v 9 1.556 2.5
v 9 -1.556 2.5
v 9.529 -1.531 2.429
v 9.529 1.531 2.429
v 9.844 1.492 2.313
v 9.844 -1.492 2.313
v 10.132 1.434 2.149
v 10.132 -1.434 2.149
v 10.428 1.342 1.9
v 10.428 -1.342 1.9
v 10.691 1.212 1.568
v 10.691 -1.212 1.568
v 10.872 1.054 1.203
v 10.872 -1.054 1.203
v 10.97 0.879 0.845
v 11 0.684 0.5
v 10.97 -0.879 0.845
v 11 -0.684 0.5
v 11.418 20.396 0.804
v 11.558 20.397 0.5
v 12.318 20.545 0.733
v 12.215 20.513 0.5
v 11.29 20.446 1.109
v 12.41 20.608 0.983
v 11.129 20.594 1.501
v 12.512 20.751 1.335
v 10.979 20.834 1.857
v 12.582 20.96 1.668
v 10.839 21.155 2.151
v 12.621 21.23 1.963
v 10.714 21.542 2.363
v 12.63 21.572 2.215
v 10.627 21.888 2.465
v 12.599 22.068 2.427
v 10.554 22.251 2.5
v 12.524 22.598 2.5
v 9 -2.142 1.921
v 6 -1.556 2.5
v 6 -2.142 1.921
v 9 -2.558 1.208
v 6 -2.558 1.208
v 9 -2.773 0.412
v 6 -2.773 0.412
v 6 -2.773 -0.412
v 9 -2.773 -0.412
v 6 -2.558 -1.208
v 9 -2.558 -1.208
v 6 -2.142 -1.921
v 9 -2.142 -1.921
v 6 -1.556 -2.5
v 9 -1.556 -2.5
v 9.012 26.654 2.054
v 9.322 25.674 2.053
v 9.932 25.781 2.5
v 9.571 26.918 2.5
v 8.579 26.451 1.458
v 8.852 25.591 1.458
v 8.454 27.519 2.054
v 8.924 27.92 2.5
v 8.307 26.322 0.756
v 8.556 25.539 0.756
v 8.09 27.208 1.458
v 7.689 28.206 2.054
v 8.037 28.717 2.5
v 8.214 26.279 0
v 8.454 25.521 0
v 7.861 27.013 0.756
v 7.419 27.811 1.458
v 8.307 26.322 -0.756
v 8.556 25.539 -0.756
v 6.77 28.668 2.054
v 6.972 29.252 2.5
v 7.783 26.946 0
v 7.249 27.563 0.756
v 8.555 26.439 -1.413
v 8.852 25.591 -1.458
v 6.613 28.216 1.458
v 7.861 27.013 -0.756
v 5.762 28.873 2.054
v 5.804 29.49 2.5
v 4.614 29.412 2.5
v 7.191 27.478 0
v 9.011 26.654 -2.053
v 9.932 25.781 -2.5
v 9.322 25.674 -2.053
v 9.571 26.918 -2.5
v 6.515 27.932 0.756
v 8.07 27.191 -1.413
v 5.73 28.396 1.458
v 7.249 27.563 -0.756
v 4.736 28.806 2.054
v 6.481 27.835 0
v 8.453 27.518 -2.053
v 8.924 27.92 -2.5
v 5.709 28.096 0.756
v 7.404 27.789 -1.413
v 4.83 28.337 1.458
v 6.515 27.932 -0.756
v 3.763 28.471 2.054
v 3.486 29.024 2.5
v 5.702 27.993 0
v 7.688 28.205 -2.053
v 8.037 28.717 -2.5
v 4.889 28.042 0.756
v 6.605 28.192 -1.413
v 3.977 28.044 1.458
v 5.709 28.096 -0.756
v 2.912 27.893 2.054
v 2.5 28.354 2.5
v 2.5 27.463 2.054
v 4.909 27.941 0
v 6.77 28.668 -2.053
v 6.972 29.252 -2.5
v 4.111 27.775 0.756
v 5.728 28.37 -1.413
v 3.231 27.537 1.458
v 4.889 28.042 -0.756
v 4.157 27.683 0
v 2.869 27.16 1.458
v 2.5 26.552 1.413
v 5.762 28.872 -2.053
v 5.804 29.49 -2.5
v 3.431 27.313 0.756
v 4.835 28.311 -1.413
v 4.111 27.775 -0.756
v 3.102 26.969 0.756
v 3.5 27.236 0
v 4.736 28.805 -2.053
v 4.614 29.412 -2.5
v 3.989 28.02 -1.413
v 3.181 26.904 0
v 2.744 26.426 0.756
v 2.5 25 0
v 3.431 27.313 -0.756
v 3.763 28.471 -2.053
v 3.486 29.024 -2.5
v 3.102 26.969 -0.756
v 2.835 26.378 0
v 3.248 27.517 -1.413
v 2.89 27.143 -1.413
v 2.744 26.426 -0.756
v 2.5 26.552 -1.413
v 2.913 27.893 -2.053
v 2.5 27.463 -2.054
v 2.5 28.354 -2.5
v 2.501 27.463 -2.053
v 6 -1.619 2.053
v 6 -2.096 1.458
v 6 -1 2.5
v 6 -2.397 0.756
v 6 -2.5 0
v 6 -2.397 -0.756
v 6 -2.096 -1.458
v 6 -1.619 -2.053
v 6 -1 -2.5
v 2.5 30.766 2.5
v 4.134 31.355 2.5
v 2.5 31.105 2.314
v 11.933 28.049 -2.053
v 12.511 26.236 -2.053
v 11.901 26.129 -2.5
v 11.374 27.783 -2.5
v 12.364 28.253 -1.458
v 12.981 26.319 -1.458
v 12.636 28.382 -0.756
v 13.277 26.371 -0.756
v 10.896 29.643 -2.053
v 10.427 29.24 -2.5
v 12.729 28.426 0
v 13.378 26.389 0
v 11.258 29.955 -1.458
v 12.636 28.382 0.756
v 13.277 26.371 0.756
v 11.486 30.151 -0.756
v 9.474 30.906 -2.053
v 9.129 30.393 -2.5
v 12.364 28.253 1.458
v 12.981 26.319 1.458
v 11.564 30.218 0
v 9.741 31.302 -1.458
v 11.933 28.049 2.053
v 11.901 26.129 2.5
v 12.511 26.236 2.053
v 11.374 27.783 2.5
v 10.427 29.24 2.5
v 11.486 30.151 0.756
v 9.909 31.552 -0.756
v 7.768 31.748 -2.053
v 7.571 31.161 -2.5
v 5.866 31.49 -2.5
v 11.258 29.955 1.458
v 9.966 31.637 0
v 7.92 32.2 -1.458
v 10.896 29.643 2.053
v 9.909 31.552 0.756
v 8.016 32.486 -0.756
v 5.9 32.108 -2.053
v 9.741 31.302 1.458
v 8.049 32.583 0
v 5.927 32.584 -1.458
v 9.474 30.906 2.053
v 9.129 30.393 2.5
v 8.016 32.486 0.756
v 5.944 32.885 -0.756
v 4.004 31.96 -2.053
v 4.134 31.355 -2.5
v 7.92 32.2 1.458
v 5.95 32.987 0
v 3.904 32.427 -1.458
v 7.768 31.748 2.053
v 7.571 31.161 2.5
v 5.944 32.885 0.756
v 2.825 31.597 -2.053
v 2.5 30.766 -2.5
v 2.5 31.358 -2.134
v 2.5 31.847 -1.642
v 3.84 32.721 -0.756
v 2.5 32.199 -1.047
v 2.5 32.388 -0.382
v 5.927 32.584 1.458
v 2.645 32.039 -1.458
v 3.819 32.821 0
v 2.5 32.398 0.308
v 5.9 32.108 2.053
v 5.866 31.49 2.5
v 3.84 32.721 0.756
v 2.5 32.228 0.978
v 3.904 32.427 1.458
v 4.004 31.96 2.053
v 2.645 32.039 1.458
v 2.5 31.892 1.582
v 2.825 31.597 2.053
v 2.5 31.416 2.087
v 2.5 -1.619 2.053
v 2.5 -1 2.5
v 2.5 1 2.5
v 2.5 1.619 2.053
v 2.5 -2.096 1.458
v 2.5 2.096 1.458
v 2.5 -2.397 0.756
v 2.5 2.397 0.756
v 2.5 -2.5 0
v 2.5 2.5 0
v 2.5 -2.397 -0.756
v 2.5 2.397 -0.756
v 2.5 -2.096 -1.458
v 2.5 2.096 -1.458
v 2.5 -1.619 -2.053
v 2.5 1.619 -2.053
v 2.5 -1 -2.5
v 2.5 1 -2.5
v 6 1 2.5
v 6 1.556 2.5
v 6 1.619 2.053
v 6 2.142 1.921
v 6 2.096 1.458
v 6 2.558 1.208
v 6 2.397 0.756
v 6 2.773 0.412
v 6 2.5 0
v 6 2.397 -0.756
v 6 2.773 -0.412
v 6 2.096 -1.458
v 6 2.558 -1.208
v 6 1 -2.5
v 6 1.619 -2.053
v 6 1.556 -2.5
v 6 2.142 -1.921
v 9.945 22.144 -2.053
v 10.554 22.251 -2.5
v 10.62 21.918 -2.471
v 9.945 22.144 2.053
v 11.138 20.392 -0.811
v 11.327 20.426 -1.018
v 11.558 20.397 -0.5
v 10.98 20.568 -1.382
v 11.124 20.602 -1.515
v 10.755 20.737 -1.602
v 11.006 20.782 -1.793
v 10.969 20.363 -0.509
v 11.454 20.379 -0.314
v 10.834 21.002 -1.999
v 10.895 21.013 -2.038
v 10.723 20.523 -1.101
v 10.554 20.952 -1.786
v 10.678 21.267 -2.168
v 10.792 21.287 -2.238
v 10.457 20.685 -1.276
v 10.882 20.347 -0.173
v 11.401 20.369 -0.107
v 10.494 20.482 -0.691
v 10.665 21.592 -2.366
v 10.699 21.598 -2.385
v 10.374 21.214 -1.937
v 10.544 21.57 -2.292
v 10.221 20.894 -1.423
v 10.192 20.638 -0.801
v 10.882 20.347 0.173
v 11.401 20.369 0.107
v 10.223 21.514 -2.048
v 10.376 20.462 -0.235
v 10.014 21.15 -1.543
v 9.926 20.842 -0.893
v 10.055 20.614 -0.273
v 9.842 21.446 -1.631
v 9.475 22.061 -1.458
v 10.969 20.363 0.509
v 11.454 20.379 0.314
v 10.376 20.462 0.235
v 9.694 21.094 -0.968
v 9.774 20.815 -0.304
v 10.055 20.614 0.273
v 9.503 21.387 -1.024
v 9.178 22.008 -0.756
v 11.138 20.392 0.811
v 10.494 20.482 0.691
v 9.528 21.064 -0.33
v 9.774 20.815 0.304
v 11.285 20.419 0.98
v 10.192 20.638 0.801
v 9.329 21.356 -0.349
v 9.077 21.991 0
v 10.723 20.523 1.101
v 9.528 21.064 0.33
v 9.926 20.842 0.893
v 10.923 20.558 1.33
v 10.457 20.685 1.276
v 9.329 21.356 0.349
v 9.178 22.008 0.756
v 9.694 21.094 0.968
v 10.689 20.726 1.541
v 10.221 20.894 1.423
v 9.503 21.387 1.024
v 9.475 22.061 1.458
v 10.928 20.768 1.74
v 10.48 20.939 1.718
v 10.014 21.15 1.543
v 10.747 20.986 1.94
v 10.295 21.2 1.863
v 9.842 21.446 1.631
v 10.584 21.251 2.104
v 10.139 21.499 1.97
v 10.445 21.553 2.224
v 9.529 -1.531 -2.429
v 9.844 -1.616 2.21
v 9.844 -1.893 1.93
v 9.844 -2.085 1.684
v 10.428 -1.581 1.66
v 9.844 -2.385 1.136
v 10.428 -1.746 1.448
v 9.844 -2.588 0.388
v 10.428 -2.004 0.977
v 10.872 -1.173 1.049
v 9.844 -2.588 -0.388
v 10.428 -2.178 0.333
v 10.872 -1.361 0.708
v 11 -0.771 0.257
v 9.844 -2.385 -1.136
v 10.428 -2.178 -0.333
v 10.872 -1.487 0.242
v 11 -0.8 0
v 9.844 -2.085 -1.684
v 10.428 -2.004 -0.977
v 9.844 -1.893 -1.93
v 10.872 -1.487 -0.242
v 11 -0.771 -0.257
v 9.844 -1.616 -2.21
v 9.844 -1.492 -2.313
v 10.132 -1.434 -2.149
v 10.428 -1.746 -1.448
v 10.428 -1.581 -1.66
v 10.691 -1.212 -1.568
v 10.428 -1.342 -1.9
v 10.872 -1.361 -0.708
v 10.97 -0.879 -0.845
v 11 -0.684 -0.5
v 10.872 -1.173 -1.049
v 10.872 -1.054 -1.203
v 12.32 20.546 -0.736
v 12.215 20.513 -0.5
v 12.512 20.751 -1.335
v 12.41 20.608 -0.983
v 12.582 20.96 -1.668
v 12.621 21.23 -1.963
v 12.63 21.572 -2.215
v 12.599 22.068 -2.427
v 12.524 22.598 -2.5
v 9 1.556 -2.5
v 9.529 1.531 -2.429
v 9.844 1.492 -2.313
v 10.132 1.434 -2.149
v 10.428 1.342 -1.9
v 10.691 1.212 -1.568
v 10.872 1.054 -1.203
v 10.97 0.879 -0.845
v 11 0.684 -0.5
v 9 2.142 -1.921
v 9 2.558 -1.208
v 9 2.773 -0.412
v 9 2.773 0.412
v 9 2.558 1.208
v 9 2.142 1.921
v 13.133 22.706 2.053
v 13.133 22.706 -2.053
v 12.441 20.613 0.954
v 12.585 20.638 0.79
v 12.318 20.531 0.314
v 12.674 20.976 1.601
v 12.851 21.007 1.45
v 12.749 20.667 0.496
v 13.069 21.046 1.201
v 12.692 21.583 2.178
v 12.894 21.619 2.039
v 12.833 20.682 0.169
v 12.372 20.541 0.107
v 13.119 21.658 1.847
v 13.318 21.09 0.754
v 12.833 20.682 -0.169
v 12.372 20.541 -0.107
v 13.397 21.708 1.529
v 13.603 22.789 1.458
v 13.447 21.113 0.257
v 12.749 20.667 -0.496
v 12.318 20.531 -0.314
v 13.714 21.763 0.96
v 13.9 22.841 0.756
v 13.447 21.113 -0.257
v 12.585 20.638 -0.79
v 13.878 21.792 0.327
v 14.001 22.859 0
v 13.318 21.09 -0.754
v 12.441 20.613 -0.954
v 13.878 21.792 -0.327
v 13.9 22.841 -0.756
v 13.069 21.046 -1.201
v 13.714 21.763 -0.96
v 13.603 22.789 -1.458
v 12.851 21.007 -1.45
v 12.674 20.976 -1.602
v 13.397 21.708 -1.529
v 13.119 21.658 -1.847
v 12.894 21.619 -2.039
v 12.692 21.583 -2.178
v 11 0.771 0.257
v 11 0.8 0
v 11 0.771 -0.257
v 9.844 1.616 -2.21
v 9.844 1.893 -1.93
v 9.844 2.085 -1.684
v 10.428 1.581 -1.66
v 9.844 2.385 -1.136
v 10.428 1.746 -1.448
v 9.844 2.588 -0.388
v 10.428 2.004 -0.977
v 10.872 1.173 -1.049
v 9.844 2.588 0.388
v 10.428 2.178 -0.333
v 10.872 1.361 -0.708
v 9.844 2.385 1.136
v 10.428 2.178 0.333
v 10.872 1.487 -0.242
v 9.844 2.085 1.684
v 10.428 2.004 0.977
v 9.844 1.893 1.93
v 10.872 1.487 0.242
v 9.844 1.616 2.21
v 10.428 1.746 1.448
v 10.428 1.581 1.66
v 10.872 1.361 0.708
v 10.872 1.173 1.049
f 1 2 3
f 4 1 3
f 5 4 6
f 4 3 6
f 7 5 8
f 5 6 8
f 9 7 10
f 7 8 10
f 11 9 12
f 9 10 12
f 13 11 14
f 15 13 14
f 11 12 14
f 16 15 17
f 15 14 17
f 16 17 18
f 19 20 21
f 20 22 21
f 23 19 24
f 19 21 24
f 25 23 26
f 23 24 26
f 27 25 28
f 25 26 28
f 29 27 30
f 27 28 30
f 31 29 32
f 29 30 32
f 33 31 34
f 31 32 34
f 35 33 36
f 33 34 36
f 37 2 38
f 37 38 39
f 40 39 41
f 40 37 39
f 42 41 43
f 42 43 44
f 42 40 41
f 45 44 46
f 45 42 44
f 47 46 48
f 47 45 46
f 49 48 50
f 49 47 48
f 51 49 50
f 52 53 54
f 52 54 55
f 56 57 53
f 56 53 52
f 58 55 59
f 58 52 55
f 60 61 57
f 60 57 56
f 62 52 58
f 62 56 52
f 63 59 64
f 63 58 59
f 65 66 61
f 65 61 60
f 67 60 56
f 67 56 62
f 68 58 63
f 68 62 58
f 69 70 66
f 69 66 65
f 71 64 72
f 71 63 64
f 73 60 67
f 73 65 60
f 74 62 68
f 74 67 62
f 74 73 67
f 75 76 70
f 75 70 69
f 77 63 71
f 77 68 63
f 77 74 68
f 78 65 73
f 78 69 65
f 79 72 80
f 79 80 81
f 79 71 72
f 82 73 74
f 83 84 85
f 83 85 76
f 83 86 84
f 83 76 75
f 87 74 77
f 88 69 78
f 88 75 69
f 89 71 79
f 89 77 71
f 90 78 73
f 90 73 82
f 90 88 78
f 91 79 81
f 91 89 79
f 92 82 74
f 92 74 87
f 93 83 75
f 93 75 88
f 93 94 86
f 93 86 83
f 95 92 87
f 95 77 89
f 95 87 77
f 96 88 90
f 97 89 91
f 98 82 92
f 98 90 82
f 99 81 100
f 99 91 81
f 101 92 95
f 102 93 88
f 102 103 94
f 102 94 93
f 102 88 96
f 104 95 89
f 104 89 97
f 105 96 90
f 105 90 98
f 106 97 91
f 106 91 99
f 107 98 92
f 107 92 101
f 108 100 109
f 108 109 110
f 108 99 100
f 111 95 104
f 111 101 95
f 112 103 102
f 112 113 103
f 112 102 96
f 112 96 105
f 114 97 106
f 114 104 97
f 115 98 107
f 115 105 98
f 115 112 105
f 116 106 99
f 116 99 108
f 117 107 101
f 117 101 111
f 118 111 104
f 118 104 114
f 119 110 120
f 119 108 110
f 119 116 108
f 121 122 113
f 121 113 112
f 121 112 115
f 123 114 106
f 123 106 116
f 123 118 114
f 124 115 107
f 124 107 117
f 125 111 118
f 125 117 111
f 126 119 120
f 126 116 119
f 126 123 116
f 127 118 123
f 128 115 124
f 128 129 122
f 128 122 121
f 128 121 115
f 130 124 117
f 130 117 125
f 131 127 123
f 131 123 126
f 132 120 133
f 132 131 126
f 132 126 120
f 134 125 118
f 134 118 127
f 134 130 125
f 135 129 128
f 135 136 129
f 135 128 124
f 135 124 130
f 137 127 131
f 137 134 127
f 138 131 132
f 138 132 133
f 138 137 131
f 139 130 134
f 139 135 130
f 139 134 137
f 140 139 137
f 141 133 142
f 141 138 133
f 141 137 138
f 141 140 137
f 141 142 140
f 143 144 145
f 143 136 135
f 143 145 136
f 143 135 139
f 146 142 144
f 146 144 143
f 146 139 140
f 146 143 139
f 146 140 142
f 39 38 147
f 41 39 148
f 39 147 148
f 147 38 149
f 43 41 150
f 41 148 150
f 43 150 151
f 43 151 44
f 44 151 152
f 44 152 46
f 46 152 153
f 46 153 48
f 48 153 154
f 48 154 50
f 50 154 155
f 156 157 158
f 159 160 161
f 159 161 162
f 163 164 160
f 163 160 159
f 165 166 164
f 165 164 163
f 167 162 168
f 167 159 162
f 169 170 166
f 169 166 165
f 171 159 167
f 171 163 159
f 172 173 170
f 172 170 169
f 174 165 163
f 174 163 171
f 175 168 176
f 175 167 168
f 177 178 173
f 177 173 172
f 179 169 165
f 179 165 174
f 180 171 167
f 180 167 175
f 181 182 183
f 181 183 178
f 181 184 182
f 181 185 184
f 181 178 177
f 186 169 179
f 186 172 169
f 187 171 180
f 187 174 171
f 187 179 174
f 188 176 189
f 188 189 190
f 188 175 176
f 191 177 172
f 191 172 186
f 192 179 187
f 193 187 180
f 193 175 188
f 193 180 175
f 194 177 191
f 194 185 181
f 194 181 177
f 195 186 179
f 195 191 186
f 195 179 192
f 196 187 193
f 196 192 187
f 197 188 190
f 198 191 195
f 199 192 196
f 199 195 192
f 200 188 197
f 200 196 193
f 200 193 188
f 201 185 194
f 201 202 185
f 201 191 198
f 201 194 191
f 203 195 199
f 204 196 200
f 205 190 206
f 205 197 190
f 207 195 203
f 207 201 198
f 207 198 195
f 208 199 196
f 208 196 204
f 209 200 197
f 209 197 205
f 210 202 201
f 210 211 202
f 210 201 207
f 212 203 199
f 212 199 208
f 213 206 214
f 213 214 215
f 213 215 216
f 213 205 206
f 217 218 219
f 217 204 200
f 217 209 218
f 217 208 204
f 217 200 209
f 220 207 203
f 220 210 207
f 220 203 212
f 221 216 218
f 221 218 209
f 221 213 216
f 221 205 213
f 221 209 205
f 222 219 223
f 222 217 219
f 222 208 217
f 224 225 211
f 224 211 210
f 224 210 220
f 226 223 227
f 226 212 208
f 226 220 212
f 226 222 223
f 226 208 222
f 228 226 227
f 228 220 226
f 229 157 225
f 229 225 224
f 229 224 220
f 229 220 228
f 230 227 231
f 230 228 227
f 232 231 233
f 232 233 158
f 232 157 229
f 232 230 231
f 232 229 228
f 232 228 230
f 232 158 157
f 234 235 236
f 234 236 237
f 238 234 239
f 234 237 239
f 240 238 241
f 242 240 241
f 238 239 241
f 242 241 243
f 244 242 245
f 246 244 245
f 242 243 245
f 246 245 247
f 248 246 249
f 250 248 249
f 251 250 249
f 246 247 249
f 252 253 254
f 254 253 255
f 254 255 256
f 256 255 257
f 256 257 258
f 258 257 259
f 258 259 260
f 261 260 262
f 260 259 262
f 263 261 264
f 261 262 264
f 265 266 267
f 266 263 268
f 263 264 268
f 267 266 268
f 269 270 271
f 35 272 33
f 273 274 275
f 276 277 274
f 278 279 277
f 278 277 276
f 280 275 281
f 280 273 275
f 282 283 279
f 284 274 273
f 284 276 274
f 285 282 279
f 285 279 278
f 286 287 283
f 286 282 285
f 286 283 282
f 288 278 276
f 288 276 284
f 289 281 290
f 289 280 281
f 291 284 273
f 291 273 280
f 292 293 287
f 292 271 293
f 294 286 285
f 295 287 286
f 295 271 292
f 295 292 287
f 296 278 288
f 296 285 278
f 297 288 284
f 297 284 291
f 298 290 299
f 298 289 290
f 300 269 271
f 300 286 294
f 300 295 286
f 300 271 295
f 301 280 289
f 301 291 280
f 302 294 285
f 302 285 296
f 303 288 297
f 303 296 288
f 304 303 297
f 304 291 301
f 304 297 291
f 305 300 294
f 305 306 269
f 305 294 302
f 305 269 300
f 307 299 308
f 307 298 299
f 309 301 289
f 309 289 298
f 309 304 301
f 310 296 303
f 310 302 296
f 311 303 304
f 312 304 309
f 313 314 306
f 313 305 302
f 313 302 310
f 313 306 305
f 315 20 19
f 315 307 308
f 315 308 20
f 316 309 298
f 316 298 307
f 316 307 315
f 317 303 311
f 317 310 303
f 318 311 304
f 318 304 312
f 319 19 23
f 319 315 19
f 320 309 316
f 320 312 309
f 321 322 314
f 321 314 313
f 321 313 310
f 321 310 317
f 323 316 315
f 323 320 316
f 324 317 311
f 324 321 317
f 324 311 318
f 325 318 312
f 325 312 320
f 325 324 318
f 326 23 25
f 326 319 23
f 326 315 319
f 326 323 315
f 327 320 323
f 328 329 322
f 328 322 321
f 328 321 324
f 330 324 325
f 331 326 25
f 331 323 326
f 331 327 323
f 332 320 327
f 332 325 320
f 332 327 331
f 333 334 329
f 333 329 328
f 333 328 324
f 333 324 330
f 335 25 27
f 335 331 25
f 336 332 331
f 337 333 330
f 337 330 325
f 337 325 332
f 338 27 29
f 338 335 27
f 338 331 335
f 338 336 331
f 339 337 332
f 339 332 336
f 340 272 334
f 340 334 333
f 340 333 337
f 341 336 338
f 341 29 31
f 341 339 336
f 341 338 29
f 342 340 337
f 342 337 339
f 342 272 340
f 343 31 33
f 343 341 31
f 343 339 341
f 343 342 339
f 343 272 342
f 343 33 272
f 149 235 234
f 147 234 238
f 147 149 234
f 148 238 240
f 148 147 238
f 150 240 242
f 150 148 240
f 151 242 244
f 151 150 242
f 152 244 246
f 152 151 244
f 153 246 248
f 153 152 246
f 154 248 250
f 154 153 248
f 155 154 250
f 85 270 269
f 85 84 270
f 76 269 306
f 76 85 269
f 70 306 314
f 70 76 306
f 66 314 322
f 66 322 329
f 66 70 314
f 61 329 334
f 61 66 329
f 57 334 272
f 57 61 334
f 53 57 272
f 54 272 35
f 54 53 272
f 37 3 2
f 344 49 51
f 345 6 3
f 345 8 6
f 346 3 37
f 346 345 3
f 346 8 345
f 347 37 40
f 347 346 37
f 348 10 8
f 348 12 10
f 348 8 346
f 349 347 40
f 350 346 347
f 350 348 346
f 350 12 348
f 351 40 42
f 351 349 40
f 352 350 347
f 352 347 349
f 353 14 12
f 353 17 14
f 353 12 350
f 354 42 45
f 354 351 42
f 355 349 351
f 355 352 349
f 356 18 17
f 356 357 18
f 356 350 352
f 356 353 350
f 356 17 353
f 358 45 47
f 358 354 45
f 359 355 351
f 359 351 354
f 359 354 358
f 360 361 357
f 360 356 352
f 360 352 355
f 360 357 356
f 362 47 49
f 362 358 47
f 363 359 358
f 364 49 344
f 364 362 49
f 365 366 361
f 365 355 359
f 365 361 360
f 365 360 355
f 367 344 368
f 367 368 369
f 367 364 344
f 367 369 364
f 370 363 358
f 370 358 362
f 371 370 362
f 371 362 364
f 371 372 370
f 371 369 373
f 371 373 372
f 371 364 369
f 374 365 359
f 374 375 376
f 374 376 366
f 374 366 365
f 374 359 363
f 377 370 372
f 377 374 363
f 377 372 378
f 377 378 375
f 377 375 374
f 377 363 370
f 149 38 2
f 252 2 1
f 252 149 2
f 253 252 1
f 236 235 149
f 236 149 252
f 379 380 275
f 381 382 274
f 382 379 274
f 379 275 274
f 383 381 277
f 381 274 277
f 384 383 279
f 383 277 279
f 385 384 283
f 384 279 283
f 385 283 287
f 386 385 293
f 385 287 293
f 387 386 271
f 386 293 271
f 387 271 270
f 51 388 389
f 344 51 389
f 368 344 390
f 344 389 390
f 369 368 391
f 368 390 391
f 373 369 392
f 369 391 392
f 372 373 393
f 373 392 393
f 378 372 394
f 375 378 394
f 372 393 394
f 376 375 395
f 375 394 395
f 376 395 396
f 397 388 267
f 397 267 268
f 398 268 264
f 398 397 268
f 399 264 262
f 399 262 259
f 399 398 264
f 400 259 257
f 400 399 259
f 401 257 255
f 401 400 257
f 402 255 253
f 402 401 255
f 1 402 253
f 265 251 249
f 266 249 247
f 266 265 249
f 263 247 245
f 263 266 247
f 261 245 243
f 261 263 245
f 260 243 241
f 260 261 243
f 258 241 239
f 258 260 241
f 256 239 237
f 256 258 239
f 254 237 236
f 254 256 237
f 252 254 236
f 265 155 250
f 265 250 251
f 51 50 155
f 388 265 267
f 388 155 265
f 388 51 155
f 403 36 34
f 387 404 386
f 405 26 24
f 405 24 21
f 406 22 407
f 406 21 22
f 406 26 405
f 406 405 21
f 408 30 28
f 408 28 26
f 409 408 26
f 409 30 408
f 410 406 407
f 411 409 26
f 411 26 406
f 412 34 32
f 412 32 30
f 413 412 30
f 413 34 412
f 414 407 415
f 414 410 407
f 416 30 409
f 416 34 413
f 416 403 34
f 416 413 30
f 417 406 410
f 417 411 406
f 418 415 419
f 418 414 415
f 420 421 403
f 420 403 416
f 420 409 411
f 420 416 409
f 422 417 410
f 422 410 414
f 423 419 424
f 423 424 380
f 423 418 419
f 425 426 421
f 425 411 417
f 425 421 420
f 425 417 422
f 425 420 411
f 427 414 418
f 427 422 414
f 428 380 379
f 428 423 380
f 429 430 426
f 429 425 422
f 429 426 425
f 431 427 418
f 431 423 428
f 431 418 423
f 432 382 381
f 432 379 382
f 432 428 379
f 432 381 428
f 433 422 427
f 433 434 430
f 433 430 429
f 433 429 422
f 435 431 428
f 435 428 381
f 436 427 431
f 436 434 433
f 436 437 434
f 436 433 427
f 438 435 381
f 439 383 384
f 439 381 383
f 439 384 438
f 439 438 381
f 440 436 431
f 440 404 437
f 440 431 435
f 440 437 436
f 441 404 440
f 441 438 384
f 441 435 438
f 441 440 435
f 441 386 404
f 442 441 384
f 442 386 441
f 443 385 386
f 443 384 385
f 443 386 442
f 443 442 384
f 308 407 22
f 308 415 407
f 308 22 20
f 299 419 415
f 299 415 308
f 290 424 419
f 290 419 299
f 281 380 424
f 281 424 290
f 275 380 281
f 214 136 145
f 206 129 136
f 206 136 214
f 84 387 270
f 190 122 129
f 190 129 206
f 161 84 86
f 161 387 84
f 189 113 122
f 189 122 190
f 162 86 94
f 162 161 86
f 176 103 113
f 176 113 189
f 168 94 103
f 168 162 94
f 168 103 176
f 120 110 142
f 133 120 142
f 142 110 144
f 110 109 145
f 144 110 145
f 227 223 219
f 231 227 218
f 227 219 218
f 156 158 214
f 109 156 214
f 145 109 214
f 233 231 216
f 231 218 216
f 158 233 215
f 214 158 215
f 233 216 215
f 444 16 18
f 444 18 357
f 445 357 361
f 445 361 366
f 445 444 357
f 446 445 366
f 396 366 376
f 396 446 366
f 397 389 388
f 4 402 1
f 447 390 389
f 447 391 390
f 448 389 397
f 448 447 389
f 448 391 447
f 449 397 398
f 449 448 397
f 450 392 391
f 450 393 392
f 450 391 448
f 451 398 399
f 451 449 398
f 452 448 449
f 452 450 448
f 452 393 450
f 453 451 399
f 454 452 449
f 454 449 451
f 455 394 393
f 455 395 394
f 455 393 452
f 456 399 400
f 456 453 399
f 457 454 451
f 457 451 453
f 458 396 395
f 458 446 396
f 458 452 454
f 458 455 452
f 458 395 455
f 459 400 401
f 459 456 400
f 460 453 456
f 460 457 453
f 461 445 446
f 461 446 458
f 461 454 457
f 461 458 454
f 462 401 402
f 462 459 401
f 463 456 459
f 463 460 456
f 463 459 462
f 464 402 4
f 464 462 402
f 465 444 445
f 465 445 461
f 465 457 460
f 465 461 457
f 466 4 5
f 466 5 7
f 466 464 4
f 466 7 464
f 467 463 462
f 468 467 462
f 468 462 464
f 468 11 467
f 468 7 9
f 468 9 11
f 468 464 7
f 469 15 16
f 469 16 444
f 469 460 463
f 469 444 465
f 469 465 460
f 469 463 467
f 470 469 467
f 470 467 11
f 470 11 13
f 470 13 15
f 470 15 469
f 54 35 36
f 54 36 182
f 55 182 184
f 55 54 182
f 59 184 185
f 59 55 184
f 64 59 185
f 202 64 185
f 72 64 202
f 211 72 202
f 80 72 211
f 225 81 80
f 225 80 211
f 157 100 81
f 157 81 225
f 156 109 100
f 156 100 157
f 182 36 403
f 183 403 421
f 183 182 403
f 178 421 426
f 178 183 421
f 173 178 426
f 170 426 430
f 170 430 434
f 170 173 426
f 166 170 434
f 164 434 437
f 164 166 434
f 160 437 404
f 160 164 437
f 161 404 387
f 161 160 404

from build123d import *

# Parameters (mm, degrees)
EXTRUDE_1_DEPTH     = 5
SKETCH_19_W         = 5
SKETCH_19_H         = 18
EXTRUDE_2_DEPTH     = 1.5
FILLET_2_R          = 2
SKETCH_20_W         = 13
SKETCH_20_H         = 40
CUT_EXTRUDE_1_DEPTH = 10


with BuildPart() as part:
    # 扫描2: sweep along a path in 草图1
    with BuildLine(Plane.XY) as sweep_2_path:
        Line((11.886241035, 20.455064977), (10.916442642, 25.955064977))
        ThreePointArc((10.916442642, 25.955064977), (5.020643415, 30.47907084), (0, 25))
        Line((0, 25), (0, 0))
        Line((0, 0), (0, -3))
    # 草图13 → 扫描2 (sweep)
    with BuildSketch(Plane(origin=(0, -3, 0), x_dir=(1, 0, 0), z_dir=(0, 1, 0))):
        with BuildLine():
            Line((-1, -2.5), (1, -2.5))
            ThreePointArc((1, -2.5), (2.5, 0), (1, 2.5))
            Line((1, 2.5), (-1, 2.5))
            ThreePointArc((-1, 2.5), (-2.5, 0), (-1, -2.5))
        make_face()
    sweep(path=sweep_2_path.line)

    # 扫描4: sweep along a path in 草图15
    with BuildLine(Plane.XY) as sweep_4_path:
        Line((0, 0), (11, 0))
    # 草图16 → 扫描4 (sweep)
    with BuildSketch(Plane(origin=(11, 0, 0), x_dir=(0, 0, -1), z_dir=(1, 0, 0))):
        with BuildLine():
            Line((-2.5, -1), (-2.5, 1))
            ThreePointArc((-2.5, 1), (0, 2.5), (2.5, 1))
            Line((2.5, 1), (2.5, -1))
            ThreePointArc((2.5, -1), (0, -2.5), (-2.5, -1))
        make_face()
    sweep(path=sweep_4_path.line)

    # 草图17 → 凸台-拉伸1 (add)
    with BuildSketch(Plane(origin=(11, 0, 0), x_dir=(0, 0, -1), z_dir=(1, 0, 0))):
        with BuildLine():
            Line((-2.5, 1.555522876), (-2.5, -1.555522876))
            ThreePointArc((-2.5, -1.555522876), (0, -2.8), (2.5, -1.555522876))
            Line((2.5, -1.555522876), (2.5, 1.555522876))
            ThreePointArc((2.5, 1.555522876), (0, 2.8), (-2.5, 1.555522876))
        make_face()
    extrude(amount=-EXTRUDE_1_DEPTH)

    # 草图19 → 凸台-拉伸2 (add)
    with BuildSketch(Plane(origin=(1, 0, 0), x_dir=(0, 0, -1), z_dir=(1, 0, 0))):
        with Locations((0, 14)):
            Rectangle(SKETCH_19_W, SKETCH_19_H)
    extrude(amount=EXTRUDE_2_DEPTH)

    # 圆角2
    # the kernel refuses this fillet: 2 mm, written as the material it takes off along each edge
    with BuildSketch(Plane(origin=(17.795087554, 21.496954043, 2.5), x_dir=(0, 0, -1), z_dir=(-0.9848077530122092, -0.17364817766692353, 0))) as fillet_2_piece_1:
        with BuildLine():
            CenterArc((FILLET_2_R, -FILLET_2_R), FILLET_2_R, 90, 90)
            Line((0, -FILLET_2_R), (0, 0))
            Line((0, 0), (FILLET_2_R, 0))
        make_face()
    extrude(amount=12, mode=Mode.SUBTRACT)
    with BuildSketch(Plane(origin=(12.214510286, 20.512947703, 0), x_dir=(0.9423506208781961, 0.16616183974819207, -0.2904574845686963), z_dir=(0.2860447827236763, 0.050437412885072544, 0.9568878981667737))) as fillet_2_piece_2:
        with BuildLine():
            CenterArc((2.833333333 - FILLET_2_R, FILLET_2_R), FILLET_2_R, 270, 90)
            Line((2.833333333 - FILLET_2_R, 0), (2.833333333, 0))
            Line((2.833333333, 0), (2.833333333, FILLET_2_R))
        make_face()
    revolve(axis=Axis((12.214510286, 20.512947703, 0), (-0.17364817766692303, 0.9848077530122095, 0)), revolution_arc=326.229306127, mode=Mode.SUBTRACT)
    with BuildSketch(Plane(origin=(5.977394517, 19.413175911, -2.5), x_dir=(-0.17364817766692353, 0.9848077530122094, 0), z_dir=(0.9848077530122092, 0.17364817766692353, 0))) as fillet_2_piece_3:
        with BuildLine():
            CenterArc((FILLET_2_R, FILLET_2_R), FILLET_2_R, 180, 90)
            Line((0, FILLET_2_R), (0, 0))
            Line((0, 0), (FILLET_2_R, 0))
        make_face()
    extrude(amount=12, mode=Mode.SUBTRACT)
    with BuildSketch(Plane(origin=(11, -6.555522876, 2.5), x_dir=(0, 0, -1), z_dir=(0, 1, 0))) as fillet_2_piece_4:
        with BuildLine():
            CenterArc((FILLET_2_R, FILLET_2_R), FILLET_2_R, 180, 90)
            Line((0, FILLET_2_R), (0, 0))
            Line((0, 0), (FILLET_2_R, 0))
        make_face()
    extrude(amount=13.111045751, mode=Mode.SUBTRACT)
    with BuildSketch(Plane(origin=(11, 6.555522876, -2.5), x_dir=(-1, 0, 0), z_dir=(0, -1, 0))) as fillet_2_piece_5:
        with BuildLine():
            CenterArc((FILLET_2_R, -FILLET_2_R), FILLET_2_R, 90, 90)
            Line((0, -FILLET_2_R), (0, 0))
            Line((0, 0), (FILLET_2_R, 0))
        make_face()
    extrude(amount=13.111045751, mode=Mode.SUBTRACT)
    with BuildSketch(Plane(origin=(11, -0.333333333, 0), x_dir=(0, -0.8131785022115455, -0.582014367125922), z_dir=(0, -0.582014367125922, 0.8131785022115455))) as fillet_2_piece_6:
        with BuildLine():
            CenterArc((3.133333333 - FILLET_2_R, -FILLET_2_R), FILLET_2_R, 0, 90)
            Line((3.133333333, -FILLET_2_R), (3.133333333, 0))
            Line((3.133333333, 0), (3.133333333 - FILLET_2_R, 0))
        make_face()
    revolve(axis=Axis((11, -0.333333333, 0), (1, 0, 0)), revolution_arc=288.815304863, mode=Mode.SUBTRACT)
    with BuildSketch(Plane(origin=(11, 0.333333333, 0), x_dir=(0, 0.8131785022115376, 0.5820143671259329), z_dir=(0, 0.5820143671259329, -0.8131785022115376))) as fillet_2_piece_7:
        with BuildLine():
            CenterArc((3.133333333 - FILLET_2_R, -FILLET_2_R), FILLET_2_R, 0, 90)
            Line((3.133333333 - FILLET_2_R, 0), (3.133333333, 0))
            Line((3.133333333, 0), (3.133333333, -FILLET_2_R))
        make_face()
    revolve(axis=Axis((11, 0.333333333, 0), (1, 0, 0)), revolution_arc=288.815304863, mode=Mode.SUBTRACT)
    with BuildSketch(Plane(origin=(11.557971784, 20.397182251, 0), x_dir=(-0.9423506208781962, -0.1661618397481921, 0.2904574845686961), z_dir=(-0.2860447827236761, -0.050437412885072516, -0.9568878981667738))) as fillet_2_piece_8:
        with BuildLine():
            CenterArc((2.833333333 - FILLET_2_R, FILLET_2_R), FILLET_2_R, 270, 90)
            Line((2.833333333, FILLET_2_R), (2.833333333, 0))
            Line((2.833333333, 0), (2.833333333 - FILLET_2_R, 0))
        make_face()
    revolve(axis=Axis((11.557971784, 20.397182251, 0), (-0.17364817766692306, 0.9848077530122095, 0)), revolution_arc=326.229306127, mode=Mode.SUBTRACT)

    # 草图20 → 切除-拉伸1 (cut)
    with BuildSketch(Plane(origin=(2.5, 0, 0), x_dir=(0, 0, -1), z_dir=(1, 0, 0))):
        with Locations((0, 14)):
            Rectangle(SKETCH_20_W, SKETCH_20_H)
    extrude(amount=-CUT_EXTRUDE_1_DEPTH, mode=Mode.SUBTRACT)


with BuildPart() as cut_extrude_1_piece_1:
    # of the separate pieces the step leaves, piece 1, a body of its own (cut_extrude_1_pieces)
    add(part.part.solids().sort_by_distance((10.554136927, 22.251032306, -2.5))[0])


with BuildPart() as cut_extrude_1_piece_2:
    # of the separate pieces the step leaves, piece 2, a body of its own (cut_extrude_1_pieces)
    add(part.part.solids().sort_by_distance((2.5, -1, -2.5))[0])


solid = Compound([cut_extrude_1_piece_1.part, cut_extrude_1_piece_2.part])
